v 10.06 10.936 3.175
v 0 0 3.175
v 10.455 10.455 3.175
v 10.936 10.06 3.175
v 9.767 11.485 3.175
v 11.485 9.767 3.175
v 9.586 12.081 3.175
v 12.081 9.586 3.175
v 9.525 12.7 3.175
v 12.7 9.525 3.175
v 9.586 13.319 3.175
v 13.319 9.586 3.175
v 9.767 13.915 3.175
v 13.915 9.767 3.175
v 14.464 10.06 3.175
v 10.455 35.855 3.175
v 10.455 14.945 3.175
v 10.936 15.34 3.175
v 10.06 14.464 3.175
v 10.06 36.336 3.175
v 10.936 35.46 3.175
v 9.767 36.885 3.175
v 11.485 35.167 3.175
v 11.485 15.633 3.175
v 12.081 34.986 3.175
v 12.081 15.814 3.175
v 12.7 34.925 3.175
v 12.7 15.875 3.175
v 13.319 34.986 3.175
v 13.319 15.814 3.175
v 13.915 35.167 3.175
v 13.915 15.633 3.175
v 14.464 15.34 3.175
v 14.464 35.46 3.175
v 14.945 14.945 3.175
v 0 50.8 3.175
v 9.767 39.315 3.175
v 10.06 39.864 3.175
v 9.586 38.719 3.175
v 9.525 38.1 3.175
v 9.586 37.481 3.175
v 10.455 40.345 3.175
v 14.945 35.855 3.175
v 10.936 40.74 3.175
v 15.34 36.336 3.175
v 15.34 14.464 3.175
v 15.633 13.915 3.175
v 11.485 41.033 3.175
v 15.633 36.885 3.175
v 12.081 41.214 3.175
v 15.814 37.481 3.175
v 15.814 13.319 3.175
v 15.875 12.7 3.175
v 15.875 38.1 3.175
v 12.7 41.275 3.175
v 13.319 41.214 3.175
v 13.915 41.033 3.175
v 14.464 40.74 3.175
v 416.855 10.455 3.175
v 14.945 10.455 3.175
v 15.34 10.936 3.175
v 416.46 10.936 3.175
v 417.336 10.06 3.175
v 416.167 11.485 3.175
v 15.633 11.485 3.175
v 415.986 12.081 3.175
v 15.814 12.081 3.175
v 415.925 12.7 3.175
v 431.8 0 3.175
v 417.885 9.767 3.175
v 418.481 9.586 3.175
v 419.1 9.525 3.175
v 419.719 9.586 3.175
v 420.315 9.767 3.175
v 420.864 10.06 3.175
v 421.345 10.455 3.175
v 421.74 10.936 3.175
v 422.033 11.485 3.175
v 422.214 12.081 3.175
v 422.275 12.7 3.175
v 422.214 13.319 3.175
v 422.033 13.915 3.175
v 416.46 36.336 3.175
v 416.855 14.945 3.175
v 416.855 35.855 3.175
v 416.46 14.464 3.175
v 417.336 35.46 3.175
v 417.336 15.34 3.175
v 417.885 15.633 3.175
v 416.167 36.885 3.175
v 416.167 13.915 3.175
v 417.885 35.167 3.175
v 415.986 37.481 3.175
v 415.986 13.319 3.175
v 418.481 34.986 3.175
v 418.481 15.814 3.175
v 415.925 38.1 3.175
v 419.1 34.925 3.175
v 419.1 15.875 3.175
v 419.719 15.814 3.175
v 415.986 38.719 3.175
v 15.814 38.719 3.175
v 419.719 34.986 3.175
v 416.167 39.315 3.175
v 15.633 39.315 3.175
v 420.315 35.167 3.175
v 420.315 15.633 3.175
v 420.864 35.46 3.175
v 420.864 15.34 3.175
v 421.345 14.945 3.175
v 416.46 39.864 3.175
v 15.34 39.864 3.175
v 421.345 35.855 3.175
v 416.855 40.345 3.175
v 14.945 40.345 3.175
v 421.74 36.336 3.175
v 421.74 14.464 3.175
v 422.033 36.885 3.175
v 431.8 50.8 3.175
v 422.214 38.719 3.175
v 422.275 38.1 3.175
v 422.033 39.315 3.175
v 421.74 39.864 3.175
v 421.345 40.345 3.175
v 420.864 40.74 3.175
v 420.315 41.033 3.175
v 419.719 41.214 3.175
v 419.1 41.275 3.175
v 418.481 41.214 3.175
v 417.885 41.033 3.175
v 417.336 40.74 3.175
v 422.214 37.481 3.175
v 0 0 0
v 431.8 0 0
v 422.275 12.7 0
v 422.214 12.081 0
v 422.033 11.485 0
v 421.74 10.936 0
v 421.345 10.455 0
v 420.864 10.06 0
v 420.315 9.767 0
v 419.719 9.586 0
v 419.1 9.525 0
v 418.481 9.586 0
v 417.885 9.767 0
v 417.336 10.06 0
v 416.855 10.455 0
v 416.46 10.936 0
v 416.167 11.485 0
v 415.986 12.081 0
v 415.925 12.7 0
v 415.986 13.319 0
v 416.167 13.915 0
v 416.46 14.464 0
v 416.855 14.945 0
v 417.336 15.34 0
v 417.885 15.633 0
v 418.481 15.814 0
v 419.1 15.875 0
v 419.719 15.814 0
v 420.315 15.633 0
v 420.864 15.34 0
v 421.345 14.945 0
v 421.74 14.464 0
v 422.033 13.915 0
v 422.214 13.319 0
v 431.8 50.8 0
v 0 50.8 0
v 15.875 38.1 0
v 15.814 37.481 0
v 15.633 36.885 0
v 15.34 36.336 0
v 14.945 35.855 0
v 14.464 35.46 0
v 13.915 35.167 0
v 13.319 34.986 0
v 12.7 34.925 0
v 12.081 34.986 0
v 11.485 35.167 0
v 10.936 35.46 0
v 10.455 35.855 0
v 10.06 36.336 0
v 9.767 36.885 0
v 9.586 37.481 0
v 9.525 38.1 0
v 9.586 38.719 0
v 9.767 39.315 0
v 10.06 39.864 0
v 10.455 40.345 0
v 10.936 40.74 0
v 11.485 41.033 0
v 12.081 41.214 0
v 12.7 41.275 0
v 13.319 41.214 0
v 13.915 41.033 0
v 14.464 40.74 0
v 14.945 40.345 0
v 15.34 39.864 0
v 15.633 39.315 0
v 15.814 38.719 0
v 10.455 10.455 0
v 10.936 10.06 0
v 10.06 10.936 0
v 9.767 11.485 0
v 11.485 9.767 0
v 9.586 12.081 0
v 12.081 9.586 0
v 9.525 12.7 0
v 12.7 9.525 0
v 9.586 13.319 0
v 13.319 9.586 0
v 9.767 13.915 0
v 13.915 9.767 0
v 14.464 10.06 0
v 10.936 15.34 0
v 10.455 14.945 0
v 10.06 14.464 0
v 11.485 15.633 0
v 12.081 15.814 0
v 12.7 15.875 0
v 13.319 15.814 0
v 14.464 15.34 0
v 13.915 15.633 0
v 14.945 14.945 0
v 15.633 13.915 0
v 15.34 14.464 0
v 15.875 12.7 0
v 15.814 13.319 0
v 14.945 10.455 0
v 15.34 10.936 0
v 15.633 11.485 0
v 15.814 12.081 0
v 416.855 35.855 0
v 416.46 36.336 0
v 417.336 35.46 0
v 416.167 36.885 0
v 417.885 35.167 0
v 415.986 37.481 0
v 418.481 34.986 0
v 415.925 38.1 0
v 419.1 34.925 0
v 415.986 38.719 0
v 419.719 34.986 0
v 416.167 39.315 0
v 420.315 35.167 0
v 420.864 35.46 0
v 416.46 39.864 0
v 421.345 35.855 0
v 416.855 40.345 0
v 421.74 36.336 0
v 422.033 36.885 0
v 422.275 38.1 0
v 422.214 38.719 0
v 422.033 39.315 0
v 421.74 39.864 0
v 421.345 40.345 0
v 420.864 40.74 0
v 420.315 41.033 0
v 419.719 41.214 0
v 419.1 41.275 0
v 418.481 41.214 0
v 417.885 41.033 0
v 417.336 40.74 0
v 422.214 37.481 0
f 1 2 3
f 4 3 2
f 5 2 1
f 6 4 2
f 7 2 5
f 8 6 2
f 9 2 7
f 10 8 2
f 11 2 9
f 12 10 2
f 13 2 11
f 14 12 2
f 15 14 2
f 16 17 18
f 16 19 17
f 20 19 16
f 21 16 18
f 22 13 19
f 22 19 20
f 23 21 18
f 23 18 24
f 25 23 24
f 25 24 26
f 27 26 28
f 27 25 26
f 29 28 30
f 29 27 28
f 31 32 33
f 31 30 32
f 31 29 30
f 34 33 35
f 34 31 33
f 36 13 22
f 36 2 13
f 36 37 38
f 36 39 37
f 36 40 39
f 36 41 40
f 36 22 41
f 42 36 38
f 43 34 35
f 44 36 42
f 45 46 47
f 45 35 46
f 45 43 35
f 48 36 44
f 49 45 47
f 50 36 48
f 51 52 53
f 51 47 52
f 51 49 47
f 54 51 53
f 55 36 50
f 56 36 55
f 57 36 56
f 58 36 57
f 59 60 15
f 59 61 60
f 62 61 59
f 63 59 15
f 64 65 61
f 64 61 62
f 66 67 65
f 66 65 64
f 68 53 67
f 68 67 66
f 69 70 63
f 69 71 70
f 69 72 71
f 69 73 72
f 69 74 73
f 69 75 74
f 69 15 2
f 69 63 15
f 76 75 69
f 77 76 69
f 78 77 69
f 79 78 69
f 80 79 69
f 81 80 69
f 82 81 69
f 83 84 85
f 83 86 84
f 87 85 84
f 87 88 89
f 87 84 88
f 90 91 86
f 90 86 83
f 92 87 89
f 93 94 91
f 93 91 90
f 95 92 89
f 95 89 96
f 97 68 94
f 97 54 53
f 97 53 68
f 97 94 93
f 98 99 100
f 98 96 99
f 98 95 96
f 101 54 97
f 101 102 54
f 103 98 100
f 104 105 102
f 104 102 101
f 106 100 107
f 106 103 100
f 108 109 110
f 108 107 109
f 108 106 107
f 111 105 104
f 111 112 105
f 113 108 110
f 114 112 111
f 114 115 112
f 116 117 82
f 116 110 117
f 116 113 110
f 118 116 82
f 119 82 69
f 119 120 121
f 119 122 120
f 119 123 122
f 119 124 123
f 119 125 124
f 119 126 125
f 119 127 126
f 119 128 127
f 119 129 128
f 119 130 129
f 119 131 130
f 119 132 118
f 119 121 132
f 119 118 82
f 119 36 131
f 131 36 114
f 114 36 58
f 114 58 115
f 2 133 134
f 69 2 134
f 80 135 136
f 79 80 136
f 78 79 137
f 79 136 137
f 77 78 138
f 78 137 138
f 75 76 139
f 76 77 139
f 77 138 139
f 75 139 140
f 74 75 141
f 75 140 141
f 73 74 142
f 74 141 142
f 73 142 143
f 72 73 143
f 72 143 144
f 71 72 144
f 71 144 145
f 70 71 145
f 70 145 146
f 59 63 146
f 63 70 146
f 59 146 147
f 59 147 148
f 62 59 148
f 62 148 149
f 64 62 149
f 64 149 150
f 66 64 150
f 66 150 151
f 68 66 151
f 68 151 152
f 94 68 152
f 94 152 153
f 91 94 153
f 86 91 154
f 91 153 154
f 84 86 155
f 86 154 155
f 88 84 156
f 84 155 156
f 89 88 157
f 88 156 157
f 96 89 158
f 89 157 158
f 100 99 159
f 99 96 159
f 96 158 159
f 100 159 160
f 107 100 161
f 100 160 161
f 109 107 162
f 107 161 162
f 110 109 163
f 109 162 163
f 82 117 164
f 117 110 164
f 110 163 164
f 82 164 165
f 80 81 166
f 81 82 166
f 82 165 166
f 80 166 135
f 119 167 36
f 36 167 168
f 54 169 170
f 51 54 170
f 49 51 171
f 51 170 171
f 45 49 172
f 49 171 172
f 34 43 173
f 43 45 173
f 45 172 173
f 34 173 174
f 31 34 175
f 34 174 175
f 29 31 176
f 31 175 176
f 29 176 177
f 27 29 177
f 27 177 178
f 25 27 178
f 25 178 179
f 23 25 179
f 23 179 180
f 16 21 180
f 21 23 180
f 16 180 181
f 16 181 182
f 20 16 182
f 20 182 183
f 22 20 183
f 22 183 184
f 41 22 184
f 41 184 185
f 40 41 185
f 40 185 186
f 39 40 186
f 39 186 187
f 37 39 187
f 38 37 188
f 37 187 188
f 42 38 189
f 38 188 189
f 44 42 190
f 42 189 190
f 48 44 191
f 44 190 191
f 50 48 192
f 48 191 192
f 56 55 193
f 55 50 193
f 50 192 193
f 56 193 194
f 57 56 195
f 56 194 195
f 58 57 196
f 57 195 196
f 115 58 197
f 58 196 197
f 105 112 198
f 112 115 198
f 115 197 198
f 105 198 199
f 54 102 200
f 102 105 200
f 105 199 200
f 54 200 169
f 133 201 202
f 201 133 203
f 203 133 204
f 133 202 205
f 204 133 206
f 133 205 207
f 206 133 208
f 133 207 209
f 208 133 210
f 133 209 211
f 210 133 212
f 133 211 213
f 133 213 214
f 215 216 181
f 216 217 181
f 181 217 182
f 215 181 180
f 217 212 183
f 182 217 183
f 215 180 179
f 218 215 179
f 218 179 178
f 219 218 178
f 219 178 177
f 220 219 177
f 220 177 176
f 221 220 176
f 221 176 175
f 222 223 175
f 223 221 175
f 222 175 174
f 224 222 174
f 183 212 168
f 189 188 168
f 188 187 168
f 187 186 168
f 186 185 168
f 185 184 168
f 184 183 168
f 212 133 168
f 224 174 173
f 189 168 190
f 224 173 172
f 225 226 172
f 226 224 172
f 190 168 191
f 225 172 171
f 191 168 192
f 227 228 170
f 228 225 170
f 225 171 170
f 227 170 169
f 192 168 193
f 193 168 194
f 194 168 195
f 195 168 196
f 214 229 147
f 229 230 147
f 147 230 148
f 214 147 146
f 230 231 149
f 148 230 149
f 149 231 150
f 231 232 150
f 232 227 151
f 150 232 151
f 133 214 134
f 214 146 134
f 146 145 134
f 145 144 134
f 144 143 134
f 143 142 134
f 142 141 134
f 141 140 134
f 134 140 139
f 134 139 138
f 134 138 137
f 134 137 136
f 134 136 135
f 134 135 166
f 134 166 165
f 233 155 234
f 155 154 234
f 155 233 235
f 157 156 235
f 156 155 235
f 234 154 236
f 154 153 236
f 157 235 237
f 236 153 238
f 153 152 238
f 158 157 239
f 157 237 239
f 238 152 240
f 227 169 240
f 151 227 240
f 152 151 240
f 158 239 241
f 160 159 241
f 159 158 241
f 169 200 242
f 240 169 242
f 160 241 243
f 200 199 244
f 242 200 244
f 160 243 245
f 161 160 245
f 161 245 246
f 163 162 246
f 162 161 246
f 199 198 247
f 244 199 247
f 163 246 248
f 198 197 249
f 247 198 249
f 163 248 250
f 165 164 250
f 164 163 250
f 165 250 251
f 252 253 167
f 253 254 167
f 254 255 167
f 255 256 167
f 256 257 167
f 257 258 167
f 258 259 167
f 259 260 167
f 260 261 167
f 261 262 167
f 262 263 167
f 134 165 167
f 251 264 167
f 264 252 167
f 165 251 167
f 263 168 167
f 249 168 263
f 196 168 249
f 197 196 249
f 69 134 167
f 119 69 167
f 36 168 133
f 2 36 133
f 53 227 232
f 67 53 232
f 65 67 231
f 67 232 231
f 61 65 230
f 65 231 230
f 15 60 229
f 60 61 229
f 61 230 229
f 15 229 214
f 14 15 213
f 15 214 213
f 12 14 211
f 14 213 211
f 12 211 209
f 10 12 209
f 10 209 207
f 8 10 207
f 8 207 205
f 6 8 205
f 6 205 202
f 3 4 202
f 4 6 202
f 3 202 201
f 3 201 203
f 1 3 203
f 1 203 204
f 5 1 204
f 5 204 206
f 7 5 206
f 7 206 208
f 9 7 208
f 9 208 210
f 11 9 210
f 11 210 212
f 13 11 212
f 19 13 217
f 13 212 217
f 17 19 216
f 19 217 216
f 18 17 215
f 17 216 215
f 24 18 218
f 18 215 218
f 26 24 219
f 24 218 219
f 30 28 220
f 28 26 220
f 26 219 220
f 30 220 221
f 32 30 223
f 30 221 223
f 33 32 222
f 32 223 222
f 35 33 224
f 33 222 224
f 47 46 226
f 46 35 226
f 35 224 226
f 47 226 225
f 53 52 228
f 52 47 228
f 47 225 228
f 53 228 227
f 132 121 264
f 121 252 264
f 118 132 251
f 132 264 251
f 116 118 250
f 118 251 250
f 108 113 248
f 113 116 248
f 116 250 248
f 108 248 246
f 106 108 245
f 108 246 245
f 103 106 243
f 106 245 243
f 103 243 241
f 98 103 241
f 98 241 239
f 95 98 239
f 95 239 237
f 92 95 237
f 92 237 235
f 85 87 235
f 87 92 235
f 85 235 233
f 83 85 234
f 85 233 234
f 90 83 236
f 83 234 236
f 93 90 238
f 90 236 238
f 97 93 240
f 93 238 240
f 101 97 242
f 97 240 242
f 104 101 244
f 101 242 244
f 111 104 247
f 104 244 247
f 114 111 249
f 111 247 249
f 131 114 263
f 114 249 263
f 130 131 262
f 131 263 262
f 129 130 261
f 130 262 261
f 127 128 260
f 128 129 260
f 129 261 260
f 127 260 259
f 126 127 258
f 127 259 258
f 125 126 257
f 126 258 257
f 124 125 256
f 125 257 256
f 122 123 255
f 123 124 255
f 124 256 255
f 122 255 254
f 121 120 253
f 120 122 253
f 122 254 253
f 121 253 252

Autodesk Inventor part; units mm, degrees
ref_plane "YZ Plane" through (0, 0, 0) normal (1, 0, 0) x (0, 1, 0)
ref_plane "XZ Plane" through (0, 0, 0) normal (0, 1, 0) x (-1, 0, 0)
ref_plane "XY Plane" through (0, 0, 0) normal (0, 0, 1) x (1, 0, 0)
sketch "Sketch1" plane through (0, 0, 0) normal (0, 0, 1) x (1, 0, 0)
  line L0 (0, 0) -> (431.8, 0)
  line L1 (431.8, 0) -> (431.8, 50.8)
  line L2 (431.8, 50.8) -> (0, 50.8)
  line L3 (0, 50.8) -> (0, 0)
  line L4 (12.7, 50.8) -> (12.7, 0) construction
  line L5 (0, 38.1) -> (12.7, 38.1) construction
  line L6 (0, 12.7) -> (12.7, 12.7) construction
  circle A0 centre (12.7, 38.1) radius 3.175
  circle A1 centre (12.7, 12.7) radius 3.175
  line L7 (215.9, 50.8) -> (215.9, 0) construction
  line L8 (419.1, 50.8) -> (419.1, 0) construction
  line L9 (431.8, 38.1) -> (419.1, 38.1) construction
  line L10 (431.8, 12.7) -> (419.1, 12.7) construction
  circle A2 centre (419.1, 38.1) radius 3.175
  circle A3 centre (419.1, 12.7) radius 3.175
  dimension "d0" = 431.8
  dimension "d1" = 50.8
  dimension "d2" = 12.7
  dimension "d3" = 12.7
  dimension "d4" = 25.4
  dimension "d5" = 6.35
  dimension "d6" = 6.35
extrude "Extrusion1" add sketch "Sketch1" along normal blind 3.175
properties part number "crossbeam"
